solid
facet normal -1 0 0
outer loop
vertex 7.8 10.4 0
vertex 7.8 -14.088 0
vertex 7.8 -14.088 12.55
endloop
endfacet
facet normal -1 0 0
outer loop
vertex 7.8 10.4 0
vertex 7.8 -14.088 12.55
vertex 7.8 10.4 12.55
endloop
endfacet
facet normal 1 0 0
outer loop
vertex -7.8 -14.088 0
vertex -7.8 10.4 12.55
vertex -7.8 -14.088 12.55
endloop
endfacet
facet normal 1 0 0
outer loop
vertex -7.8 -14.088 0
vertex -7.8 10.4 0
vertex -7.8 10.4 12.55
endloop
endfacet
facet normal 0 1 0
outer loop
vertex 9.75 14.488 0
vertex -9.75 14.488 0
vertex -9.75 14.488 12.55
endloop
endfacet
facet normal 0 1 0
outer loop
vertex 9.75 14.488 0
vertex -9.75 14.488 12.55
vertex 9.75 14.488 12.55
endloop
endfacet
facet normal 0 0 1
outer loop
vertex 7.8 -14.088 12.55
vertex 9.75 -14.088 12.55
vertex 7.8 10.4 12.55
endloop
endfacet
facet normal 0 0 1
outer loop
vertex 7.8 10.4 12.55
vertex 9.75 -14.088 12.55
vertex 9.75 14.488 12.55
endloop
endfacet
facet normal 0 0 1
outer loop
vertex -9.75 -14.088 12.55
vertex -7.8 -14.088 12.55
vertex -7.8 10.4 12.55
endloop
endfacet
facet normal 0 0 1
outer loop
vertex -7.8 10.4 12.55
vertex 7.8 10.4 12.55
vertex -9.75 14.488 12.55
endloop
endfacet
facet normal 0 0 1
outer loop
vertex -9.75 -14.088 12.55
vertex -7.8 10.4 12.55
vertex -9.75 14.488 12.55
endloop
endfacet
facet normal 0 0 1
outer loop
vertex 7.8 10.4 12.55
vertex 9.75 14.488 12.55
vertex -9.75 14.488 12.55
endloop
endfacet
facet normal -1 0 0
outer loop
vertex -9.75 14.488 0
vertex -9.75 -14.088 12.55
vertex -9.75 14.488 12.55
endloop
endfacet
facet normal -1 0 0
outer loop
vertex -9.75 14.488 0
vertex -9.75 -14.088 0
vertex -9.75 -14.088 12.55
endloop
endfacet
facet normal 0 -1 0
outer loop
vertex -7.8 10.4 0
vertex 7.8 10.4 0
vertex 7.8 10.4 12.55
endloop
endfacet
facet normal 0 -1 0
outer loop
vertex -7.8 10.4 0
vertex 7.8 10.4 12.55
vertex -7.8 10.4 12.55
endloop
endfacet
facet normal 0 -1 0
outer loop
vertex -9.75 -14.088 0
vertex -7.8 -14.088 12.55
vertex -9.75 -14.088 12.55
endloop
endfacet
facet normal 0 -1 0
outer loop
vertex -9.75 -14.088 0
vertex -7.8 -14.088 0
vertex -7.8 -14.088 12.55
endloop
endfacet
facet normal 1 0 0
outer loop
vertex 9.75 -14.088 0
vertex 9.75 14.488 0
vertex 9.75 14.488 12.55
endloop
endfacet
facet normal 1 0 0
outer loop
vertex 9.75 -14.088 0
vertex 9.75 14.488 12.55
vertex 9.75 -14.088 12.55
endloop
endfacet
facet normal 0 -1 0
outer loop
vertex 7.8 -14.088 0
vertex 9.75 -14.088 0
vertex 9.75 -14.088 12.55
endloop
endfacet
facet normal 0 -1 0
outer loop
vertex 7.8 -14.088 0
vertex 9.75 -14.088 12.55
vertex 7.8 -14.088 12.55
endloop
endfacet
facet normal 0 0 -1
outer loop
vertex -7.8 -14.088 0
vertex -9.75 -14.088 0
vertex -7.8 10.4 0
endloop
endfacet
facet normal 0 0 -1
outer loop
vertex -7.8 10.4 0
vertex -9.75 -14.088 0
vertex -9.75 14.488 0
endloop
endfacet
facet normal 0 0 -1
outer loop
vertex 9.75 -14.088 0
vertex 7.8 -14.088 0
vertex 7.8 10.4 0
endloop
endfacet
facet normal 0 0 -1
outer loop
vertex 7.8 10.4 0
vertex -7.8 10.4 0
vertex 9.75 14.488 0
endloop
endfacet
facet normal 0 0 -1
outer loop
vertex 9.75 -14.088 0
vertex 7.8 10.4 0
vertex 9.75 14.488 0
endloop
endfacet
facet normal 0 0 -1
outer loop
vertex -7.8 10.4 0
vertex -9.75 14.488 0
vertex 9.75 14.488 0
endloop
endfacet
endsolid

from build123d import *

# Parameters (mm, degrees)
SKETCH1_W           = 19.5
SKETCH1_H           = 26
BOSS_EXTRUDE1_DEPTH = 10
CUT_EXTRUDE1_REACH  = 21.08
SKETCH2_W           = 15.6
SKETCH2_H           = 20.8
CUT_EXTRUDE2_REACH  = 31.514
SKETCH3_R           = 1.25
CUT_EXTRUDE5_DEPTH  = 10
SKETCH8_W           = 19.5
SKETCH8_H           = 10
BOSS_EXTRUDE2_DEPTH = 1.4875
SKETCH9_W           = 15.6
SKETCH9_H           = 1.4875
SKETCH9_W_2         = 1.95
CUT_EXTRUDE7_DEPTH  = 21.123373381
SKETCH10_W          = 1.95
SKETCH10_H          = 10
BOSS_EXTRUDE3_DEPTH = 14.2875
BOSS_EXTRUDE4_DEPTH = 2.55


with BuildPart() as part:
    # Sketch1 → Boss-Extrude1 (new body)
    with BuildSketch(Plane.XY):
        Rectangle(SKETCH1_W, SKETCH1_H)
    extrude(amount=BOSS_EXTRUDE1_DEPTH)

    # Sketch2 → Cut-Extrude1 (cut, up to next)
    with BuildSketch(Plane.XY.offset(10), mode=Mode.PRIVATE) as cut_extrude1_sk1:
        Rectangle(SKETCH2_W, SKETCH2_H)
    cut_extrude1_tool1 = extrude(cut_extrude1_sk1.sketch, amount=-CUT_EXTRUDE1_REACH, mode=Mode.PRIVATE) & part.part
    add(cut_extrude1_tool1.solids().sort_by_distance((0, 0, 10))[0], mode=Mode.SUBTRACT)

    # Sketch3 → Cut-Extrude2 (cut, up to next)
    with BuildSketch(Plane.XZ.offset(13), mode=Mode.PRIVATE) as cut_extrude2_sk1:
        with Locations(Location((-5.85, 5, 0), (0, 0, 270))):
            Circle(SKETCH3_R)
    cut_extrude2_tool1 = extrude(cut_extrude2_sk1.sketch, amount=-CUT_EXTRUDE2_REACH, mode=Mode.PRIVATE) & part.part
    # Sketch3 → Cut-Extrude2 (cut, up to next)
    with BuildSketch(Plane.XZ.offset(13), mode=Mode.PRIVATE) as cut_extrude2_sk2:
        with Locations(Location((5.85, 5, 0), (0, 0, 270))):
            Circle(SKETCH3_R)
    cut_extrude2_tool2 = extrude(cut_extrude2_sk2.sketch, amount=-CUT_EXTRUDE2_REACH, mode=Mode.PRIVATE) & part.part
    add(cut_extrude2_tool1.solids().sort_by_distance((-5.85, -13, 5))[0], mode=Mode.SUBTRACT)
    add(cut_extrude2_tool2.solids().sort_by_distance((5.85, -13, 5))[0], mode=Mode.SUBTRACT)

    # Sketch6 → Cut-Extrude5 (cut)
    with BuildSketch(Plane.XY.offset(10)):
        Polygon((-7.8, -1.2875), (-9.75, -1.2875), (-9.75, -13), (9.75, -13), (9.75, -1.2875), (7.8, -1.2875), (7.8, -10.4), (-7.8, -10.4), align=None)
    extrude(amount=-CUT_EXTRUDE5_DEPTH, mode=Mode.SUBTRACT)

    # Sketch8 → Boss-Extrude2 (add)
    with BuildSketch(Plane(origin=(0, 13, 0), x_dir=(1, 0, 0), z_dir=(0, 1, 0))):
        with Locations((0, -5)):
            Rectangle(SKETCH8_W, SKETCH8_H)
    extrude(amount=BOSS_EXTRUDE2_DEPTH)

    # Sketch9 → Cut-Extrude7 (cut, through all)
    with BuildSketch(Plane.XY.offset(10)):
        with Locations((0, -0.54375)):
            Rectangle(SKETCH9_W, SKETCH9_H)
        with Locations((8.775, -0.54375)):
            Rectangle(SKETCH9_W_2, SKETCH9_H)
        with Locations((-8.775, -0.54375)):
            Rectangle(SKETCH9_W_2, SKETCH9_H)
    extrude(amount=-CUT_EXTRUDE7_DEPTH, mode=Mode.SUBTRACT)

    # Sketch10 → Boss-Extrude3 (add)
    with BuildSketch(Plane.XZ.offset(-0.2)):
        with Locations((-8.775, 5)):
            Rectangle(SKETCH10_W, SKETCH10_H)
        with Locations((8.775, 5)):
            Rectangle(SKETCH10_W, SKETCH10_H)
    extrude(amount=BOSS_EXTRUDE3_DEPTH)

    # Sketch11 → Boss-Extrude4 (add)
    with BuildSketch(Plane.XY.offset(10)):
        Polygon((-9.75, -14.0875), (-9.75, 14.4875), (9.75, 14.4875), (9.75, -14.0875), (7.8, -14.0875), (7.8, 10.4), (-7.8, 10.4), (-7.8, -14.0875), align=None)
    extrude(amount=BOSS_EXTRUDE4_DEPTH)


solid = part.part
